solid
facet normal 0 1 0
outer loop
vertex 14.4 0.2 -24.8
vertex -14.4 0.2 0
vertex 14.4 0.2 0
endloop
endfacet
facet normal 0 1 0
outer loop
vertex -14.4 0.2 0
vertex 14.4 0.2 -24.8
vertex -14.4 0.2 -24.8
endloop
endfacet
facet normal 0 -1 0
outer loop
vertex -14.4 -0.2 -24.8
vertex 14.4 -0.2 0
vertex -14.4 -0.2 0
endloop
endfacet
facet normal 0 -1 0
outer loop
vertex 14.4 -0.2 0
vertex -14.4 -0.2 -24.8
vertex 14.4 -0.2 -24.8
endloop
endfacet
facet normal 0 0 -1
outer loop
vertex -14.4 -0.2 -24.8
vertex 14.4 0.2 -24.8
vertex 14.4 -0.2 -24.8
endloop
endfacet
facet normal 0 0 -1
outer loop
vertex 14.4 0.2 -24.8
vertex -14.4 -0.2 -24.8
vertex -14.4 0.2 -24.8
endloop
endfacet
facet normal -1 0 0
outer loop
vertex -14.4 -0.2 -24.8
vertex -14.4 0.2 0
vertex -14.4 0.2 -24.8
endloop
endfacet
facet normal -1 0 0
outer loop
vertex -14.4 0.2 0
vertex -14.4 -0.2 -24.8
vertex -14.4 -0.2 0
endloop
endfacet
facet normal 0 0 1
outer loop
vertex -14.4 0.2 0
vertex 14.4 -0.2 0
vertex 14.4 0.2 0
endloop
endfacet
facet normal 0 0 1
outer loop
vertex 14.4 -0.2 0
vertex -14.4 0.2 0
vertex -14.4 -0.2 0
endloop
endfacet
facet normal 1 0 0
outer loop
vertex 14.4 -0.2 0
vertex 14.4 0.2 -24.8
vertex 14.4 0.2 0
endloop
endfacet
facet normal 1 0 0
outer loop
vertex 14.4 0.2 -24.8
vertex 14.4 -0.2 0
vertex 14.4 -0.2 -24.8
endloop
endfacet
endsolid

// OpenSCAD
// file: ../p/box.scad
use <../lib.scad>
function ldraw_lib__box() = [
// 0 Box 6 (six faces)
// 0 Name: box.dat
// 0 Author: James Jessiman
// 0 !LDRAW_ORG Primitive UPDATE 2002-05
// 0 !LICENSE Licensed under CC BY 4.0 : see CAreadme.txt
// 
// 0 BFC CERTIFY CCW
  [0,"BFC","CERTIFY"],
  [0,"BFC","CCW"],
// 
// 0 !HISTORY 2002-08-22 [sbliss] Applied BFC
// 0 !HISTORY 2002-11-30 [PTadmin] Official Update 2002-05
// 0 !HISTORY 2007-06-24 [PTadmin] Header formatted for Contributor Agreement
// 0 !HISTORY 2008-07-01 [PTadmin] Official Update 2008-01
// 
// 
// 2 24 1 1 1 -1 1 1
  [2,24,1,1,1,-1,1,1],
// 2 24 -1 1 1 -1 1 -1
  [2,24,-1,1,1,-1,1,-1],
// 2 24 -1 1 -1 1 1 -1
  [2,24,-1,1,-1,1,1,-1],
// 2 24 1 1 -1 1 1 1
  [2,24,1,1,-1,1,1,1],
// 2 24 1 -1 1 -1 -1 1
  [2,24,1,-1,1,-1,-1,1],
// 2 24 -1 -1 1 -1 -1 -1
  [2,24,-1,-1,1,-1,-1,-1],
// 2 24 -1 -1 -1 1 -1 -1
  [2,24,-1,-1,-1,1,-1,-1],
// 2 24 1 -1 -1 1 -1 1
  [2,24,1,-1,-1,1,-1,1],
// 2 24 1 -1 1 1 1 1
  [2,24,1,-1,1,1,1,1],
// 2 24 -1 -1 1 -1 1 1
  [2,24,-1,-1,1,-1,1,1],
// 2 24 1 -1 -1 1 1 -1
  [2,24,1,-1,-1,1,1,-1],
// 2 24 -1 -1 -1 -1 1 -1
  [2,24,-1,-1,-1,-1,1,-1],
// 4 16 1 1 1 1 1 -1 -1 1 -1 -1 1 1
  [4,16,1,1,1,1,1,-1,-1,1,-1,-1,1,1],
// 4 16 -1 -1 -1 1 -1 -1 1 -1 1 -1 -1 1
  [4,16,-1,-1,-1,1,-1,-1,1,-1,1,-1,-1,1],
// 4 16 -1 -1 1 1 -1 1 1 1 1 -1 1 1
  [4,16,-1,-1,1,1,-1,1,1,1,1,-1,1,1],
// 4 16 -1 -1 -1 -1 -1 1 -1 1 1 -1 1 -1
  [4,16,-1,-1,-1,-1,-1,1,-1,1,1,-1,1,-1],
// 4 16 1 -1 -1 -1 -1 -1 -1 1 -1 1 1 -1
  [4,16,1,-1,-1,-1,-1,-1,-1,1,-1,1,1,-1],
// 4 16 1 -1 1 1 -1 -1 1 1 -1 1 1 1
  [4,16,1,-1,1,1,-1,-1,1,1,-1,1,1,1],
// 0
];
module ldraw_lib__box(step=0, col=false, unit=2/5, alt=false, line=0.2, solid=!$preview)
    makepoly(ldraw_lib__box(), step=step, col=col, unit=unit, alt=alt, line=line, solid=solid);
ldraw_lib__box(line=0.2);
// main file
use <../lib.scad>
use <../p/box.scad>
function ldraw_lib__u8037() = [
// 0 ~Mursten Glass for Window  1 x  4 x  3
// 0 Name: u8037.dat
// 0 Author: Steffen [Steffen]
// 0 !LDRAW_ORG Part UPDATE 2019-02
// 0 !LICENSE Licensed under CC BY 4.0 : see CAreadme.txt
// 
// 0 BFC CERTIFY CCW
  [0,"BFC","CERTIFY"],
  [0,"BFC","CCW"],
// 
// 0 !CATEGORY Window
// 0 !KEYWORDS Automatic Binding Brick
// 
// 0 !CMDLINE -c47
// 
// 0 !HISTORY 2019-09-09 [PTadmin] Official Update 2019-02
// 
// 
// 1 16 0 31 0 36 0 0 0 0 31 0 0.5 0 box.dat
  [1,16,0,31,0,36,0,0,0,0,31,0,0.5,0, ldraw_lib__box()],
];
module ldraw_lib__u8037(step=0, col=false, unit=2/5, alt=false, line=0.2, solid=!$preview)
    makepoly(ldraw_lib__u8037(), step=step, col=col, unit=unit, alt=alt, line=line, solid=solid);
ldraw_lib__u8037(line=0.2);
